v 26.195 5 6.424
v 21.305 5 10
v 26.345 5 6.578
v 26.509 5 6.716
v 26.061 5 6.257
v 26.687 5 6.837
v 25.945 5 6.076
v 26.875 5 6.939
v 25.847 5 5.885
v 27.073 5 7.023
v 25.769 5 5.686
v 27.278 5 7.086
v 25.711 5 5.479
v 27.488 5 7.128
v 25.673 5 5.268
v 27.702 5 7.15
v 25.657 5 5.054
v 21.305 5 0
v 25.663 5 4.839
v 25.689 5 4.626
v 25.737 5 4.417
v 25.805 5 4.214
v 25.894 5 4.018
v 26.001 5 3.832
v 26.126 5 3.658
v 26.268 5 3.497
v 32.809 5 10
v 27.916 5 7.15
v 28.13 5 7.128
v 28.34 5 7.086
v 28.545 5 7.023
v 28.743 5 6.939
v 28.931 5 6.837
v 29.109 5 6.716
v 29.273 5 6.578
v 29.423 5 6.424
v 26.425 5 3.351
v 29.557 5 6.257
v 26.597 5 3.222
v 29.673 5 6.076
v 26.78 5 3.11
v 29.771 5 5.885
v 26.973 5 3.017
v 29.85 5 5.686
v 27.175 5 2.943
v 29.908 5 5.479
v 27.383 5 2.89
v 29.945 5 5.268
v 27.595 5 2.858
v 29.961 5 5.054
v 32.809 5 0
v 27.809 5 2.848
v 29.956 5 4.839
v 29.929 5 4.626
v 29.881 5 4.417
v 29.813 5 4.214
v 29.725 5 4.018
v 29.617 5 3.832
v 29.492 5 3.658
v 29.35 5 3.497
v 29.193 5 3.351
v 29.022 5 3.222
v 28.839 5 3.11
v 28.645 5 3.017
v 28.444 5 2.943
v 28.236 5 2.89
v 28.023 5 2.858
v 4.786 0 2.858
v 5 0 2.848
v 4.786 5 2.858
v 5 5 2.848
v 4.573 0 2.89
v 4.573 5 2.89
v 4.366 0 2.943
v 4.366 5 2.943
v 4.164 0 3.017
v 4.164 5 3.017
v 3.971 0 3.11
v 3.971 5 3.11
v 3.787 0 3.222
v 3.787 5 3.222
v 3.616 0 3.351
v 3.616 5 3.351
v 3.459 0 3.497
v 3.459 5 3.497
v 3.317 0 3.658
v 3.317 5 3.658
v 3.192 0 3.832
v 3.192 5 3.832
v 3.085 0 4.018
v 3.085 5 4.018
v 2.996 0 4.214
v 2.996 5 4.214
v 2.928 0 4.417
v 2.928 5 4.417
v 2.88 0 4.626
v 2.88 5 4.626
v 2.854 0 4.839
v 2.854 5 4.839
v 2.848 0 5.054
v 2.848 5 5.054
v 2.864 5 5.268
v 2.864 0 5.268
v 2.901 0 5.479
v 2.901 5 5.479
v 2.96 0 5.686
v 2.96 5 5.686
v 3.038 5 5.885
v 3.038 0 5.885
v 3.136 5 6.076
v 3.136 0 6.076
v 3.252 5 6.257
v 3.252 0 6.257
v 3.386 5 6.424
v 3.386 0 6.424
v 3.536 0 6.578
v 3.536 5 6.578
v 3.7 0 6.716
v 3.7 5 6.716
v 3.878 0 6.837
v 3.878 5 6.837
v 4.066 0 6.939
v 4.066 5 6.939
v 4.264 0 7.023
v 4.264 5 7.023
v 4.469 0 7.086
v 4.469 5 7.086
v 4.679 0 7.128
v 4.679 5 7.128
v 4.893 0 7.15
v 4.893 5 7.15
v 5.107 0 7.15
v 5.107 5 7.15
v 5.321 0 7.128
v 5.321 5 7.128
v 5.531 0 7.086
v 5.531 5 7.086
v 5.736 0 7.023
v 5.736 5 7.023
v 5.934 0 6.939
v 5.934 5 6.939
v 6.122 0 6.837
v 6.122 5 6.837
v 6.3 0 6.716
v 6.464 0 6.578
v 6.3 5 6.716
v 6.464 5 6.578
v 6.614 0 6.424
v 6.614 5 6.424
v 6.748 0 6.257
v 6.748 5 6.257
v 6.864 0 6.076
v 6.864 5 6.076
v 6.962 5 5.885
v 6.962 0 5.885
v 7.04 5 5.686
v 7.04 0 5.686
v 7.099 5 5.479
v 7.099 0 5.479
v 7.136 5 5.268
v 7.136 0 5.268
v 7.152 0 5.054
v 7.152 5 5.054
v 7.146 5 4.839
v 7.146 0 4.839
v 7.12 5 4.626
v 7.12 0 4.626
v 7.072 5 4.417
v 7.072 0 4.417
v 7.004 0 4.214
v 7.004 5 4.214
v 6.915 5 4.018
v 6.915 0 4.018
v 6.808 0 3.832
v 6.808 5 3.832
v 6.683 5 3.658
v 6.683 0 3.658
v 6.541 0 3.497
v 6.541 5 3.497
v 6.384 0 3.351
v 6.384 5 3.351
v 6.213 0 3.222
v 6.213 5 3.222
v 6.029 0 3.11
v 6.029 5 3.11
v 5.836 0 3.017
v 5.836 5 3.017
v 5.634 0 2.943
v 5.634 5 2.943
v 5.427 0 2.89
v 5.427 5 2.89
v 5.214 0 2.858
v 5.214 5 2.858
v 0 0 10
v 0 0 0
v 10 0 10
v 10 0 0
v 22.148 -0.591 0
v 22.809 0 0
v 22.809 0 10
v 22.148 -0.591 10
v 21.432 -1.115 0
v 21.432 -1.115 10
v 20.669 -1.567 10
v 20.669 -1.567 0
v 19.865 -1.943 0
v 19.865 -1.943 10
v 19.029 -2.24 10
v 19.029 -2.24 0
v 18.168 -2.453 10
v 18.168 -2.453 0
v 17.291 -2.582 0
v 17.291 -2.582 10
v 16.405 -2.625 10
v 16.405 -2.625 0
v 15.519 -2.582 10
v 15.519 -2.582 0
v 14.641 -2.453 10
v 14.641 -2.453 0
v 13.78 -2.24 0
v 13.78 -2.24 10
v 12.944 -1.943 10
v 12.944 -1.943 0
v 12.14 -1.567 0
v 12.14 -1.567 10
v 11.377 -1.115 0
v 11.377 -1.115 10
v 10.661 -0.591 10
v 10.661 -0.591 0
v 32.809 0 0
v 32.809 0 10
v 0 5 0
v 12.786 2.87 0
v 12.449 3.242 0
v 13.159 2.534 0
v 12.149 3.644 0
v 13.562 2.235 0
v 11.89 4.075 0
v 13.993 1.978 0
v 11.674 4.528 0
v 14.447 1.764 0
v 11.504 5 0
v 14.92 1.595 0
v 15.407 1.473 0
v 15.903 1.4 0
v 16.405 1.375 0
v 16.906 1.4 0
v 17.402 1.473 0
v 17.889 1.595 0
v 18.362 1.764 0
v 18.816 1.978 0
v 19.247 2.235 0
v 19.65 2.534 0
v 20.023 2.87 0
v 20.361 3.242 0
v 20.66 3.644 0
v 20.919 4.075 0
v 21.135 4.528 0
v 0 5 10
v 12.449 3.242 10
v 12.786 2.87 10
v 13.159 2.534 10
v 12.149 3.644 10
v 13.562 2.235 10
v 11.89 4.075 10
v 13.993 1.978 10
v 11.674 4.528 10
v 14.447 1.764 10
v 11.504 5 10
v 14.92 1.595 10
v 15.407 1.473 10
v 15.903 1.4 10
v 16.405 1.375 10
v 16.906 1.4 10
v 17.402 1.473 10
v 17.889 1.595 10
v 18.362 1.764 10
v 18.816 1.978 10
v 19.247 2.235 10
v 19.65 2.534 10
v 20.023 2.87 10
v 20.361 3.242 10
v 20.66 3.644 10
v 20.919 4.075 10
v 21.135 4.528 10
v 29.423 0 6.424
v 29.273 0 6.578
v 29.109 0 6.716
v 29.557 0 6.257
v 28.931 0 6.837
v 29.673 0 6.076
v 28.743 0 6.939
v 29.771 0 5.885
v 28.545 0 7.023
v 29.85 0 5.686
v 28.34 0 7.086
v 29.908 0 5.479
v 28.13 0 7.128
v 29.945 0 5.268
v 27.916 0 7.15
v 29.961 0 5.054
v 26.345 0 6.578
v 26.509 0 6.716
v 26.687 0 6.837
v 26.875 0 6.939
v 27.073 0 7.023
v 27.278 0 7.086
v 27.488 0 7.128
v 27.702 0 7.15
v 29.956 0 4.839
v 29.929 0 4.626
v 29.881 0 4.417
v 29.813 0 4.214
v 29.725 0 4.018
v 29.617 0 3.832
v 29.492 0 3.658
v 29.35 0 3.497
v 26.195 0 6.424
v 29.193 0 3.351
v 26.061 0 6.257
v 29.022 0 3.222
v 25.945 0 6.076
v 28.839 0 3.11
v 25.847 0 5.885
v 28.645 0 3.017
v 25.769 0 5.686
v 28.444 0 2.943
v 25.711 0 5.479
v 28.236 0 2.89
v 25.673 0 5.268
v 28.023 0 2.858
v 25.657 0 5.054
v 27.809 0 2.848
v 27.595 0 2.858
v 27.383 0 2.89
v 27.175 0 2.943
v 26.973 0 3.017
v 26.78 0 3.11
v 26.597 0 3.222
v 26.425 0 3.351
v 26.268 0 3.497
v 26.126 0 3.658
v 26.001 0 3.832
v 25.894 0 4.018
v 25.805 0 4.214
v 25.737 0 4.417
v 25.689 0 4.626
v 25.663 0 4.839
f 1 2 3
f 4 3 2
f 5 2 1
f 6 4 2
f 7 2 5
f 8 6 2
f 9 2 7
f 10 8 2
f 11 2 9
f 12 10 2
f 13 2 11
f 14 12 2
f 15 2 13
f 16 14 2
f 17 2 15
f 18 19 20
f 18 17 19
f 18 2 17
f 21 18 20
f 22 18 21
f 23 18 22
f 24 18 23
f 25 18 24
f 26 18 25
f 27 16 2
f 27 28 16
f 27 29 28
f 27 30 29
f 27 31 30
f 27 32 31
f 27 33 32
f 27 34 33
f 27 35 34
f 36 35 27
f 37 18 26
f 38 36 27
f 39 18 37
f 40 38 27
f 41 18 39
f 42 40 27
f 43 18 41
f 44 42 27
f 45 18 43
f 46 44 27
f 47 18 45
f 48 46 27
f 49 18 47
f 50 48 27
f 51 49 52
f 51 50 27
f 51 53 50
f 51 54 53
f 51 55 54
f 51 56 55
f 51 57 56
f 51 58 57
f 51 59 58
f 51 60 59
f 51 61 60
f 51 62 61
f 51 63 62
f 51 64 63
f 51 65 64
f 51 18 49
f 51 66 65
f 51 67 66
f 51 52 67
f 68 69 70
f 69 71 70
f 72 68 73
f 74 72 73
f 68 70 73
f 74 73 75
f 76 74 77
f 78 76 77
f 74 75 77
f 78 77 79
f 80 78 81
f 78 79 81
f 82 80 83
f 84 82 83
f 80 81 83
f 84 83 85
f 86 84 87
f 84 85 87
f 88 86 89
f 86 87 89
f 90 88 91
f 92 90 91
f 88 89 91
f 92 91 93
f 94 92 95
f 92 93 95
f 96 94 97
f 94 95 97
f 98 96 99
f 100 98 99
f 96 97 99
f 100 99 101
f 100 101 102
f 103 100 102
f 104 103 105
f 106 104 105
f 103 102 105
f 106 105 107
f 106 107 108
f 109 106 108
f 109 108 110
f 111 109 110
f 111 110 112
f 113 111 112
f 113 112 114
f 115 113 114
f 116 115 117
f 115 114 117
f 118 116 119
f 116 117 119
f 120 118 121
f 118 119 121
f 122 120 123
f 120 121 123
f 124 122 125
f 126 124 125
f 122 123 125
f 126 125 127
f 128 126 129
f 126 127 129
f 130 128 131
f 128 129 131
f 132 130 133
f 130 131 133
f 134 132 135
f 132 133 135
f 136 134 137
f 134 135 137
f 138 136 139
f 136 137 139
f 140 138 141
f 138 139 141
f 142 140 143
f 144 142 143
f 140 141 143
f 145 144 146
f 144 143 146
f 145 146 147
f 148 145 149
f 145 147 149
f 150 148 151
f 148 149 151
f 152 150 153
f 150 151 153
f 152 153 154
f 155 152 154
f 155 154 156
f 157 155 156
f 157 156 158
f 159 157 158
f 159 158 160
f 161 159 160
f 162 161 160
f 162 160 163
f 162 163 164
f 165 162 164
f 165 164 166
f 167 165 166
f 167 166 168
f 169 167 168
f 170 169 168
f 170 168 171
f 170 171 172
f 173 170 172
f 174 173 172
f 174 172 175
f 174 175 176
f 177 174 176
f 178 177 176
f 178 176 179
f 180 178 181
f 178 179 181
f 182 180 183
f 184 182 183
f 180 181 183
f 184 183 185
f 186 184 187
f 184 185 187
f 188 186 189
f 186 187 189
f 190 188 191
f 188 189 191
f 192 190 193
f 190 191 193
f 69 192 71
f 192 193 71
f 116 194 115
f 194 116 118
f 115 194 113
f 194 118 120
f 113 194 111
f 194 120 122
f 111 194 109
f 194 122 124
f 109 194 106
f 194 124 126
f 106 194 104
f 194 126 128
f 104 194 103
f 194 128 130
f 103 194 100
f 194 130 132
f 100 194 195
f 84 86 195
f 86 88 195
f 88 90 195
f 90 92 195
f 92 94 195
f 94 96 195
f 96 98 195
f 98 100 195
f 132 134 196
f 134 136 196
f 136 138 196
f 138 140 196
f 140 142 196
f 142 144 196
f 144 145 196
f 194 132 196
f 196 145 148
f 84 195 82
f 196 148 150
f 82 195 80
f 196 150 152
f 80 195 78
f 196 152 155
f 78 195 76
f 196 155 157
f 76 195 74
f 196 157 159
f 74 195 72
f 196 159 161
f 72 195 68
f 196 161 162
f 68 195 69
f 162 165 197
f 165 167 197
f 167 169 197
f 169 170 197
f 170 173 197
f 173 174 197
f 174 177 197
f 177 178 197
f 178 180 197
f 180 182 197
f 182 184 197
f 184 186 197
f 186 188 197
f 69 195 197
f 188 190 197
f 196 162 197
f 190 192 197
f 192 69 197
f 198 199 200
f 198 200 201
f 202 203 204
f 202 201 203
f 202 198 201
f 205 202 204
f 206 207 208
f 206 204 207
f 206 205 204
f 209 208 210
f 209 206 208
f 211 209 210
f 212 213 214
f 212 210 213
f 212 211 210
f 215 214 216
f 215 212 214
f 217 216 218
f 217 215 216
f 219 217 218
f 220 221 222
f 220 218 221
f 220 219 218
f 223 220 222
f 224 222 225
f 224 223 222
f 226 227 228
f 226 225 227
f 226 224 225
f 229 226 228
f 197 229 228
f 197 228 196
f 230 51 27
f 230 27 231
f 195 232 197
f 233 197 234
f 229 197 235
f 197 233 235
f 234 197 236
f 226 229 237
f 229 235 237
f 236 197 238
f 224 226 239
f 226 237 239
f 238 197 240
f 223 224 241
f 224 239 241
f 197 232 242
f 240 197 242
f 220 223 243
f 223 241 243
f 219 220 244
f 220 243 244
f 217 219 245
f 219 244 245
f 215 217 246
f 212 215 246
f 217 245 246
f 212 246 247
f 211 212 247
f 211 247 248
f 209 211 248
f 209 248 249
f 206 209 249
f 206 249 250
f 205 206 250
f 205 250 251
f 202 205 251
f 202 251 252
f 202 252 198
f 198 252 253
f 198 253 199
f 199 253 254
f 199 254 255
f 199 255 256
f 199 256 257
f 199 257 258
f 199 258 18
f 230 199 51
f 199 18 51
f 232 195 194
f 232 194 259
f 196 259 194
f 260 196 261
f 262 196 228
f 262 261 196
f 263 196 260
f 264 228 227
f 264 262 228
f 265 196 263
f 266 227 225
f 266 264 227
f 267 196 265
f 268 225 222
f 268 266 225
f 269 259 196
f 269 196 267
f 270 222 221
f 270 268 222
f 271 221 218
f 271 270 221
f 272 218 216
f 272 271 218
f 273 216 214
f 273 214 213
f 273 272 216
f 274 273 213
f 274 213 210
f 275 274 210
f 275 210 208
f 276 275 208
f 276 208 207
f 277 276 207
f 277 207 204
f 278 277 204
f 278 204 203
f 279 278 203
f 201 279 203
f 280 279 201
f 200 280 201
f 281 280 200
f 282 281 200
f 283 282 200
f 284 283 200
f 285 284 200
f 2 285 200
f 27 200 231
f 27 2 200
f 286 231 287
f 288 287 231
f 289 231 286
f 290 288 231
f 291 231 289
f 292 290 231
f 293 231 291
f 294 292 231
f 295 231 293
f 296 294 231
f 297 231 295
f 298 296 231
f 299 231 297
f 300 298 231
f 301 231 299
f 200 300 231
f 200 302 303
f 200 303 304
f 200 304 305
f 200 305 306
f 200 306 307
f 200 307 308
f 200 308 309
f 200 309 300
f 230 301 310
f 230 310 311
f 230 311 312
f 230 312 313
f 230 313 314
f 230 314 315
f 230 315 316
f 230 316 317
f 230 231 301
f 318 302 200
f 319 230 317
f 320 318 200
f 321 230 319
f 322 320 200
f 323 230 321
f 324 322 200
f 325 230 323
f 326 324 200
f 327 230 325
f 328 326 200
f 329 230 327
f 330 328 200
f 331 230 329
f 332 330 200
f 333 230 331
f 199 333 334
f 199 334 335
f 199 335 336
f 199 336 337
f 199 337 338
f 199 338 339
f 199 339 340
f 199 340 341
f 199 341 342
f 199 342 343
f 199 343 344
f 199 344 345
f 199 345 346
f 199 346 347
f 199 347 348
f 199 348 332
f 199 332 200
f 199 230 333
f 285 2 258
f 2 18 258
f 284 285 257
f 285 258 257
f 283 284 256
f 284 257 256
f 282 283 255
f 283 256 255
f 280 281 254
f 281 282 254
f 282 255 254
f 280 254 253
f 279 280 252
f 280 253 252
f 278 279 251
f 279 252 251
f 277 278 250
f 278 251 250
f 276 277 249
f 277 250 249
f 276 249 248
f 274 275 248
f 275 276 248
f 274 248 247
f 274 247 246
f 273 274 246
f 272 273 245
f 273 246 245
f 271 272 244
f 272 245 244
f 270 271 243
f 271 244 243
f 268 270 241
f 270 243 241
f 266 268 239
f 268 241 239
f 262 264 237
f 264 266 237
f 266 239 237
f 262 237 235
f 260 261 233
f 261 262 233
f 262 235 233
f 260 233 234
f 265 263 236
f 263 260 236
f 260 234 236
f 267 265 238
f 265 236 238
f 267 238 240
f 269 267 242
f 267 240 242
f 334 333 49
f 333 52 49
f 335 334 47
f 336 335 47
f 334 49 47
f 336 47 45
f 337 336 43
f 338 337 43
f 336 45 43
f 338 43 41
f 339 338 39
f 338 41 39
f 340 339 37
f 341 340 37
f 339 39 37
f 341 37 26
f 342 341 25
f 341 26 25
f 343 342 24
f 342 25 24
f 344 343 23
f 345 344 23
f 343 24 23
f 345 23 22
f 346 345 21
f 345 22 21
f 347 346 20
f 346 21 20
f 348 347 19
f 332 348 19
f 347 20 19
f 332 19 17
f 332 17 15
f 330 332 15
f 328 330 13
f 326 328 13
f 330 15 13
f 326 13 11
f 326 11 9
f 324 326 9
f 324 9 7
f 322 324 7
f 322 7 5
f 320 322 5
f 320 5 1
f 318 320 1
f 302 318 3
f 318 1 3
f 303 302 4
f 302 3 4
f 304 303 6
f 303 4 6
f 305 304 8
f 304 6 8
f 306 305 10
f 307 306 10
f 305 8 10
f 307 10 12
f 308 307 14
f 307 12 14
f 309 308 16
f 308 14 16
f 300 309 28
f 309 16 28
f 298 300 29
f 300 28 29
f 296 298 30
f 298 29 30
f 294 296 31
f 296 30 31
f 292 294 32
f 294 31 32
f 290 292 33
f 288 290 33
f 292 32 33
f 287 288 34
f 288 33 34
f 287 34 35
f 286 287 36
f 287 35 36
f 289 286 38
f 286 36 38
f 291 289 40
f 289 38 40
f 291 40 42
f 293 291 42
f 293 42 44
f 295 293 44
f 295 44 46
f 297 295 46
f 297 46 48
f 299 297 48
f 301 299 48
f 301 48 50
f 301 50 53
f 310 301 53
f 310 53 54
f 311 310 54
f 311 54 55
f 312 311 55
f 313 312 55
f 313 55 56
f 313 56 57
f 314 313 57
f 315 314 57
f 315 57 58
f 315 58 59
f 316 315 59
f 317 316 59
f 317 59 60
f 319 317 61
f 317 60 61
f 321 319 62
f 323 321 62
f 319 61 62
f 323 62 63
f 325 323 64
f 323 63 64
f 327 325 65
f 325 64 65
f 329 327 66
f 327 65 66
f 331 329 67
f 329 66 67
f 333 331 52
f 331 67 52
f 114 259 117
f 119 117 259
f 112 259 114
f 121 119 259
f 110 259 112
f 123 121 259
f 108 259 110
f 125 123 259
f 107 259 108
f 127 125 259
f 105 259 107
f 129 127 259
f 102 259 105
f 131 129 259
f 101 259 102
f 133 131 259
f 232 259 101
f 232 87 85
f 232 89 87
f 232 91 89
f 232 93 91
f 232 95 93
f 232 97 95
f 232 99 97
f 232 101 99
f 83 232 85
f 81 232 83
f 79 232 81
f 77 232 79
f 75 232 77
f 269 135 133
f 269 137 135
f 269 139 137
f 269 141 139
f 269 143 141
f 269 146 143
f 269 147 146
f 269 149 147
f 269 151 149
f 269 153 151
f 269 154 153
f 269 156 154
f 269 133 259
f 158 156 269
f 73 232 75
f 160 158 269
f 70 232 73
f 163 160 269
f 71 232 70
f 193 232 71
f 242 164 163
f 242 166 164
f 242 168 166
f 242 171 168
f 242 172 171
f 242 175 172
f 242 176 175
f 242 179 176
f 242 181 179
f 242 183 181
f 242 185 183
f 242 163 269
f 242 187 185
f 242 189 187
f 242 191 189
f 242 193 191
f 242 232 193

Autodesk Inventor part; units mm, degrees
ref_plane "YZ Plane" through (0, 0, 0) normal (1, 0, 0) x (0, 1, 0)
ref_plane "XZ Plane" through (0, 0, 0) normal (0, 1, 0) x (-1, 0, 0)
ref_plane "XY Plane" through (0, 0, 0) normal (0, 0, 1) x (1, 0, 0)
sketch "Sketch1" plane through (0, 0, 0) normal (0, 0, 1) x (1, 0, 0)
  line L0 (0, 0) -> (10, 0)
  line L1 (0, 0) -> (0, 5)
  line L2 (0, 5) -> (11.504, 5)
  arc A0 (11.504, 5) -> (21.3051, 5) centre (16.4046, 6.5) ccw
  arc A1 (10, 0) -> (22.8091, 0) centre (16.4046, 6.5) ccw
  line L3 (21.3051, 5) -> (32.8091, 5)
  line L4 (32.8091, 5) -> (32.8091, 0)
  line L5 (32.8091, 0) -> (22.8091, 0)
  dimension "d0" = 10
  dimension "d1" = 11.504
  dimension "d2" = 5
  dimension "d3" = 5.125
  dimension "d4" = 1.5
extrude "Extrusion1" add sketch "Sketch1" along normal blind 10
sketch "Sketch2" plane through (22.8091, 0, 0) normal (0, -1, 0) x (1, 0, 0)
  line L0 (0, 0) -> (10, 0) projected
  line L1 (10, 0) -> (10, 10) projected
  line L2 (0, 10) -> (10, 10) projected
  line L3 (0, 0) -> (0, 10) projected
  line L4 (-22.8091, 0) -> (-12.8091, 0) projected
  line L5 (-12.8091, 0) -> (-12.8091, 10) projected
  line L6 (-22.8091, 10) -> (-12.8091, 10) projected
  line L7 (-22.8091, 0) -> (-22.8091, 10) projected
  line L8 (-22.8091, 0) -> (-22.8091, 10) projected
  line L9 (-22.8091, 10) -> (-12.8091, 0)
  line L10 (-22.8091, 0) -> (-12.8091, 10)
  line L11 (0, 10) -> (10, 0)
  line L12 (0, 0) -> (10, 0) projected
  line L13 (0, 0) -> (10, 10)
  point P0 (-17.8091, 5)
  point P1 (5, 5)
hole "Hole1" at (5, 0, 5) at (27.8091, 0, 5) direction (0, 1, 0) diameter 4.305 end through all clearance for "Flat Head Machine Screw (82)" size "#6" standard "Ansi Unified Screw Threads"
properties part number "clampCap"
